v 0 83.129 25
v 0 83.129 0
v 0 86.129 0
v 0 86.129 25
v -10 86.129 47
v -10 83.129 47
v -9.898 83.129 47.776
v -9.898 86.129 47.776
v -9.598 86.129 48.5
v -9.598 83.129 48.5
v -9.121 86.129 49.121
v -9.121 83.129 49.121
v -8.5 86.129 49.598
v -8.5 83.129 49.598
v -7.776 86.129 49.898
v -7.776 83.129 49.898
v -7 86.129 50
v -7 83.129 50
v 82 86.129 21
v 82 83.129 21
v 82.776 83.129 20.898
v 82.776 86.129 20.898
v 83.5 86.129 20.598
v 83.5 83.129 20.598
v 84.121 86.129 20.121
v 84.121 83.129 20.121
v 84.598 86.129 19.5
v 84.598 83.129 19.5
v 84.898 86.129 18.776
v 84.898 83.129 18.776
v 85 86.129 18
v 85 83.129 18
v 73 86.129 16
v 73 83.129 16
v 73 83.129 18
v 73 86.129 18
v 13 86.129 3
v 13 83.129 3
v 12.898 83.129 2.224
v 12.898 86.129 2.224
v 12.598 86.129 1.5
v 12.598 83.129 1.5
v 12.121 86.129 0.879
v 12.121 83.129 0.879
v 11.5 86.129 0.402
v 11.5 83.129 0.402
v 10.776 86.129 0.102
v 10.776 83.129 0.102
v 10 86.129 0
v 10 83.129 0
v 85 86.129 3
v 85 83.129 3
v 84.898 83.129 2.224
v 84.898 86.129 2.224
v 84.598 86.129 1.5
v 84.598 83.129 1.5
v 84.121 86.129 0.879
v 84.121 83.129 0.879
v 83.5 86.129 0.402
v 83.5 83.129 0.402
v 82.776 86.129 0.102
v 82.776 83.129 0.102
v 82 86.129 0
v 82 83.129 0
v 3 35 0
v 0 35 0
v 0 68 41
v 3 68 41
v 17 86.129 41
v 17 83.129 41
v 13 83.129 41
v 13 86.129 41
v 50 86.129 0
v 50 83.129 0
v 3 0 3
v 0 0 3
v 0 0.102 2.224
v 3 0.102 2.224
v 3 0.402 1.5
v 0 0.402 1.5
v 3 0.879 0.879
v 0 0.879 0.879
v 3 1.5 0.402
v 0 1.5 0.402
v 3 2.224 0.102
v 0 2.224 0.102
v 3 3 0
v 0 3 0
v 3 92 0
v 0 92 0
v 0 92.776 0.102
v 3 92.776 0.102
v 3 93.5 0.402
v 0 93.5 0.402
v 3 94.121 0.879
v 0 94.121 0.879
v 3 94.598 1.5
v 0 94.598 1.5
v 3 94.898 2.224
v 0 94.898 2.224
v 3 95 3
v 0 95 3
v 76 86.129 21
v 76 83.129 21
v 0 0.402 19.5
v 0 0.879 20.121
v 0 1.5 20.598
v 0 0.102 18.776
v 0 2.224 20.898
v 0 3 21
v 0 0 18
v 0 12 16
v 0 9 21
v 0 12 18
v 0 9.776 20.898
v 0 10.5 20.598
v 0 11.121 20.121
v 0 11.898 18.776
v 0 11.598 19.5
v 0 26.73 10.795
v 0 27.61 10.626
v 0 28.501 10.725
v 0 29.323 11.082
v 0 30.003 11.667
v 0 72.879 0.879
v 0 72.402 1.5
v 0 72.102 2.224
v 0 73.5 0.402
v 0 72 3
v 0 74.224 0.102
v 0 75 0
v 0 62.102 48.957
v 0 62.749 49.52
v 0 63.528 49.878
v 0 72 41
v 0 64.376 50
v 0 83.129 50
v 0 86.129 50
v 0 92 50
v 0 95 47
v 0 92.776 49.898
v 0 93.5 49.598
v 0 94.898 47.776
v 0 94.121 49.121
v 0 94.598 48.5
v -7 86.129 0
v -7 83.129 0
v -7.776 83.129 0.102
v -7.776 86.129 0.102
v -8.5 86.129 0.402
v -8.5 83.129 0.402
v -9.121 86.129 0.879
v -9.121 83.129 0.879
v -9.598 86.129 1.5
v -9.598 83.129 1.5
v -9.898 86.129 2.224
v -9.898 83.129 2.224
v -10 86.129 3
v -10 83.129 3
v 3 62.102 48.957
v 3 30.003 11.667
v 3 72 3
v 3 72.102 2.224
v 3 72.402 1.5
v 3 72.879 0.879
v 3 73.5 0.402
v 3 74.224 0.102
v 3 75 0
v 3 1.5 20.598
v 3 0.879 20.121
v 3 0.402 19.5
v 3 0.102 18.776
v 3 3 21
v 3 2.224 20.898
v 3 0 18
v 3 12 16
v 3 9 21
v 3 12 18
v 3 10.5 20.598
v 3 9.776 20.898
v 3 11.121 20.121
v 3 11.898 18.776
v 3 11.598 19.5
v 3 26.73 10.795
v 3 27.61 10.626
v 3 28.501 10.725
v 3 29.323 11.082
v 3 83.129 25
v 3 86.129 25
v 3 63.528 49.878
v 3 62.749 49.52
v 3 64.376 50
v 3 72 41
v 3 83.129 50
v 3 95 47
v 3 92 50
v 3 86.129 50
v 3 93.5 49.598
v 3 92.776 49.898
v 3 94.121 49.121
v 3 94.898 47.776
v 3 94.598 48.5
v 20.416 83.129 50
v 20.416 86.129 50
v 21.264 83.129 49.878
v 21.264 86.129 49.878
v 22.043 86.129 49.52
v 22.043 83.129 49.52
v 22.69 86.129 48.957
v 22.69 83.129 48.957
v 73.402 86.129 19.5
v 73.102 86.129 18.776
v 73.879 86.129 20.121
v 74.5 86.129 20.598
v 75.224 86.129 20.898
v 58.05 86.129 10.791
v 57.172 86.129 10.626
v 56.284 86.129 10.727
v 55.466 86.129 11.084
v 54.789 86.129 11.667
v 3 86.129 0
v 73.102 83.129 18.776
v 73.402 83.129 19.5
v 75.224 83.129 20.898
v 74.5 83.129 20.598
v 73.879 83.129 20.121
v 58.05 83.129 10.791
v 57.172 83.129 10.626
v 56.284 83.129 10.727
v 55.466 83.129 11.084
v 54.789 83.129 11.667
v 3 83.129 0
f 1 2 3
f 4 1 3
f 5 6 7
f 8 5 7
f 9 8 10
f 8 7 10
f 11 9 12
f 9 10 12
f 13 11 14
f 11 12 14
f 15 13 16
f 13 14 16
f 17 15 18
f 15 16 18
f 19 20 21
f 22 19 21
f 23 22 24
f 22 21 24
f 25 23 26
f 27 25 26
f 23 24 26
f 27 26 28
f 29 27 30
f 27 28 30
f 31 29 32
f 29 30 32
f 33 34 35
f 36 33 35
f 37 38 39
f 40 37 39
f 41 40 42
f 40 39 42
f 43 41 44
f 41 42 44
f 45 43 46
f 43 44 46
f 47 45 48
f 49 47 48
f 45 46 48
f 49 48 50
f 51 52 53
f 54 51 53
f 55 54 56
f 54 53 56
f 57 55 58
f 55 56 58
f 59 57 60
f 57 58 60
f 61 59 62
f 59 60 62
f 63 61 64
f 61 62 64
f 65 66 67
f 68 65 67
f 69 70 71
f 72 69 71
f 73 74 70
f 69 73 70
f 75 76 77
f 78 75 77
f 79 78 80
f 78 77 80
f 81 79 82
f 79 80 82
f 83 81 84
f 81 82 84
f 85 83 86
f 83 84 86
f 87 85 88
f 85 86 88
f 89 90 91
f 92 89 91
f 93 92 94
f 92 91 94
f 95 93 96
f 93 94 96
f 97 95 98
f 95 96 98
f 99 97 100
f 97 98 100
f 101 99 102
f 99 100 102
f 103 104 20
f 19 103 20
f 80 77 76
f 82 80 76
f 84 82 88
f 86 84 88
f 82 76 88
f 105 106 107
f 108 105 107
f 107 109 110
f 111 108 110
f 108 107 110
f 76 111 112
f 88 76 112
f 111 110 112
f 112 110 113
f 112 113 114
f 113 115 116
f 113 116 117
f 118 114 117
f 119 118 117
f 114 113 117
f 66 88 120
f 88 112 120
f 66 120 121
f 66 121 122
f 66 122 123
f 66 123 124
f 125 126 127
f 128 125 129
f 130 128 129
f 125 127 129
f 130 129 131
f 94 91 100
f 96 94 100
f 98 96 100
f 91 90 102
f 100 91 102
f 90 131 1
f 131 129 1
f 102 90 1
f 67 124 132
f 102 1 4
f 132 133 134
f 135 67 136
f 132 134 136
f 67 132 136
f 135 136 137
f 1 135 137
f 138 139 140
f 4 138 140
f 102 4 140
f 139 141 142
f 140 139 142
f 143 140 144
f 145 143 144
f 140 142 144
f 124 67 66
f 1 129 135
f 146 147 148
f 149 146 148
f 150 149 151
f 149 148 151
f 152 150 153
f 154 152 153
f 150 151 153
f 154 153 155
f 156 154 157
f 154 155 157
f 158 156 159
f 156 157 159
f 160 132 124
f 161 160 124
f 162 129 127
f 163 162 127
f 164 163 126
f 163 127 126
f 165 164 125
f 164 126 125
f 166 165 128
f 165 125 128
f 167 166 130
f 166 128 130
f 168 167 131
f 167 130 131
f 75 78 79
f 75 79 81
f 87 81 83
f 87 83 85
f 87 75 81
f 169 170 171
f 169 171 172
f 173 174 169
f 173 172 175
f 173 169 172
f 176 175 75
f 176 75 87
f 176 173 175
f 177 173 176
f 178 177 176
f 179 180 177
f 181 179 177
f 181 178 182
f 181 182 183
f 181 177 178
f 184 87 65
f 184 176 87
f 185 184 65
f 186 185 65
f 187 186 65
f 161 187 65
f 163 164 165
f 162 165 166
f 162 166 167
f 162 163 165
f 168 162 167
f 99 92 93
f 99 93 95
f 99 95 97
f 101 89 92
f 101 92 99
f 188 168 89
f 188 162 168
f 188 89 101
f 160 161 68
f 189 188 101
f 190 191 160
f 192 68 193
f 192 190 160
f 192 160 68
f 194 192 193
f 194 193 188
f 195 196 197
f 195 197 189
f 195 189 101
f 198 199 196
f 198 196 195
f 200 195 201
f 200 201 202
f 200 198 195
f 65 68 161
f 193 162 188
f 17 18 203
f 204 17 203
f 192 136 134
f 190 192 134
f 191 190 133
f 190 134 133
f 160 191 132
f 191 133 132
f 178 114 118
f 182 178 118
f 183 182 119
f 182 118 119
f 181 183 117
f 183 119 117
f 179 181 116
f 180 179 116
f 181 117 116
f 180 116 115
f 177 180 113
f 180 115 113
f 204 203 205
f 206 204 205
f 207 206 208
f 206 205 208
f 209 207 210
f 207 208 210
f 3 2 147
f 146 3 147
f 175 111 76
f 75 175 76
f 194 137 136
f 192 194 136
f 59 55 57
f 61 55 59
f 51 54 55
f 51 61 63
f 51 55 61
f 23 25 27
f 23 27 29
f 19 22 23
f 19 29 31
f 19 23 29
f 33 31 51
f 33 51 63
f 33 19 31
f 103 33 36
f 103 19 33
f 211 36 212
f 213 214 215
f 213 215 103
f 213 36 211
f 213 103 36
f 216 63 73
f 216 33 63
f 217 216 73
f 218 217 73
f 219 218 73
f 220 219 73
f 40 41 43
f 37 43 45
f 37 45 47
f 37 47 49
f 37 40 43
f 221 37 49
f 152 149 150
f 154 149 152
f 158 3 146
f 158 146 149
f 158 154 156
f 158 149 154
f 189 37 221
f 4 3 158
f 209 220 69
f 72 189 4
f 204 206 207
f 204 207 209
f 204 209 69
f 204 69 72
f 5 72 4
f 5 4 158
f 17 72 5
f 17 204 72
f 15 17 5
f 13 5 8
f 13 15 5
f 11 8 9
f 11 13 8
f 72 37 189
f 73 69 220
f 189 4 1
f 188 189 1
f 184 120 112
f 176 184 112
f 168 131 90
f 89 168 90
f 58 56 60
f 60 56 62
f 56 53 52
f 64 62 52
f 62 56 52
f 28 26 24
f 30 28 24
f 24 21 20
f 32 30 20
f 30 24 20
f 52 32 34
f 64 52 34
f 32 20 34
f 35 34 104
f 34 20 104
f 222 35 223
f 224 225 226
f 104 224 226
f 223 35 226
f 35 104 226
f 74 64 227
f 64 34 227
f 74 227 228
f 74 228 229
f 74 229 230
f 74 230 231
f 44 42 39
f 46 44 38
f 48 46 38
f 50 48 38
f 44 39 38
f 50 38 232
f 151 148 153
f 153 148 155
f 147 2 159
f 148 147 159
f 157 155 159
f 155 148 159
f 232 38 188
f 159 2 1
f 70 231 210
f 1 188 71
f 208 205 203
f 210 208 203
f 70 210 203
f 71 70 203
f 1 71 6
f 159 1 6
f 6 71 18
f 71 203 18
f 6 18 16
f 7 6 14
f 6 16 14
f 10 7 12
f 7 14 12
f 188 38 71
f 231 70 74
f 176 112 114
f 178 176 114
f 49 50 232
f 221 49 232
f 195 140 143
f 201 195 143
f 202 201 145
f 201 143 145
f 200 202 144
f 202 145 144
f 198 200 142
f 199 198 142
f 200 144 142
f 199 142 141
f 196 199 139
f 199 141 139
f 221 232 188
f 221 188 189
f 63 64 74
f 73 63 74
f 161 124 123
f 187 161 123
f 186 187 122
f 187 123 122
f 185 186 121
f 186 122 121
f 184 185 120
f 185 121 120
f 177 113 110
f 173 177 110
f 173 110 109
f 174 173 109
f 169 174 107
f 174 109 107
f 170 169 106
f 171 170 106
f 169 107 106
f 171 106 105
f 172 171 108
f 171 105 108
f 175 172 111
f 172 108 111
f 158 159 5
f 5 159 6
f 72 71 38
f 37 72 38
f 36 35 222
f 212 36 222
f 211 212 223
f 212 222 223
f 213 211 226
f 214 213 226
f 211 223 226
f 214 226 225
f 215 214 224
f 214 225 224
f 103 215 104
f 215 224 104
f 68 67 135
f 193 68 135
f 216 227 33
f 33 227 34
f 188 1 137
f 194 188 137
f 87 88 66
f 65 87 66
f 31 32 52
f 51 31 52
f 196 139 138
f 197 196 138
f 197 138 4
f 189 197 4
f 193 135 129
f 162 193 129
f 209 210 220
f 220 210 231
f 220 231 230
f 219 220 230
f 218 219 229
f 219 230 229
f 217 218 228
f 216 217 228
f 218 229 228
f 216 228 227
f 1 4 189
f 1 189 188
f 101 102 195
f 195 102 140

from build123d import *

# Parameters (mm, degrees)
F2_DEPTH = 3
F3_W     = 3
F3_H     = 25
F4_DEPTH = 3


with BuildPart() as f2:
    # F1 (on Right) → F2 (new body)
    with BuildSketch(Plane.YZ):
        with BuildLine():
            ThreePointArc((72, 3), (72.8786796564, 0.8786796564), (75, 0))
            Line((75, 0), (92, 0))
            ThreePointArc((92, 0), (94.1213203436, 0.8786796564), (95, 3))
            Line((95, 3), (95, 47))
            ThreePointArc((95, 47), (94.1213203436, 49.1213203436), (92, 50))
            Line((92, 50), (86.1294953823, 50))
            Line((86.1294953823, 50), (86.1294953823, 25))
            Line((86.1294953823, 25), (83.1294953823, 25))
            Line((83.1294953823, 25), (83.1294953823, 50))
            Line((83.1294953823, 50), (64.3759964546, 50))
            ThreePointArc((64.3759964546, 50), (63.1252838778, 49.7268513069), (62.1023249714, 48.9571453667))
            Line((62.1023249714, 48.9571453667), (30.003192595, 11.6666695733))
            ThreePointArc((30.003192595, 11.6666695733), (28.5013733556, 10.7248075041), (26.7300434508, 10.7952031948))
            Line((26.7300434508, 10.7952031948), (12, 16))
            Line((12, 16), (12, 18))
            ThreePointArc((12, 18), (11.1213203436, 20.1213203436), (9, 21))
            Line((9, 21), (3, 21))
            ThreePointArc((3, 21), (0.8786796564, 20.1213203436), (0, 18))
            Line((0, 18), (0, 3))
            ThreePointArc((0, 3), (0.8786796564, 0.8786796564), (3, 0))
            Line((3, 0), (35, 0))
            Line((35, 0), (68, 41))
            Line((68, 41), (72, 41))
            Line((72, 41), (72, 3))
        make_face()
    extrude(amount=F2_DEPTH)


with BuildPart() as f4:
    # F3 (on face) → F4 (new body)
    with BuildSketch(Plane(origin=(0, 83.1294953823, 0), x_dir=(-1, 0, 0), z_dir=(0, 1, 0))):
        with BuildLine():
            ThreePointArc((-13, 3), (-12.1213203436, 0.8786796564), (-10, 0))
            Line((-10, 0), (7, 0))
            ThreePointArc((7, 0), (9.1213203436, 0.8786796564), (10, 3))
            Line((10, 3), (10, 47))
            ThreePointArc((10, 47), (9.1213203436, 49.1213203436), (7, 50))
            Line((7, 50), (1.3374346048, 50))
            Line((1.3374346048, 50), (0, 50))
            Line((0, 50), (0, 25))
            Line((0, 25), (-3, 25))
            Line((-3, 25), (-3, 50))
            Line((-3, 50), (-20.4160643229, 50))
            ThreePointArc((-20.4160643229, 50), (-21.6667768998, 49.7268513069), (-22.6897358061, 48.9571453667))
            Line((-22.6897358061, 48.9571453667), (-54.7888681825, 11.6666695733))
            ThreePointArc((-54.7888681825, 11.6666695733), (-56.2843439163, 10.7265038805), (-58.0496252352, 10.7908549899))
            Line((-58.0496252352, 10.7908549899), (-73, 16))
            Line((-73, 16), (-73, 18))
            ThreePointArc((-73, 18), (-73.8786796564, 20.1213203436), (-76, 21))
            Line((-76, 21), (-82, 21))
            ThreePointArc((-82, 21), (-84.1213203436, 20.1213203436), (-85, 18))
            Line((-85, 18), (-85, 3))
            ThreePointArc((-85, 3), (-84.1213203436, 0.8786796564), (-82, 0))
            Line((-82, 0), (-50, 0))
            Line((-50, 0), (-17, 41))
            Line((-17, 41), (-13, 41))
            Line((-13, 41), (-13, 3))
        make_face()
        with Locations((-1.5, 37.5)):
            Rectangle(F3_W, F3_H)
    extrude(amount=F4_DEPTH)

    # F5: cut F2
    add(f2.part, mode=Mode.SUBTRACT)


solid = Compound([f2.part, f4.part])
